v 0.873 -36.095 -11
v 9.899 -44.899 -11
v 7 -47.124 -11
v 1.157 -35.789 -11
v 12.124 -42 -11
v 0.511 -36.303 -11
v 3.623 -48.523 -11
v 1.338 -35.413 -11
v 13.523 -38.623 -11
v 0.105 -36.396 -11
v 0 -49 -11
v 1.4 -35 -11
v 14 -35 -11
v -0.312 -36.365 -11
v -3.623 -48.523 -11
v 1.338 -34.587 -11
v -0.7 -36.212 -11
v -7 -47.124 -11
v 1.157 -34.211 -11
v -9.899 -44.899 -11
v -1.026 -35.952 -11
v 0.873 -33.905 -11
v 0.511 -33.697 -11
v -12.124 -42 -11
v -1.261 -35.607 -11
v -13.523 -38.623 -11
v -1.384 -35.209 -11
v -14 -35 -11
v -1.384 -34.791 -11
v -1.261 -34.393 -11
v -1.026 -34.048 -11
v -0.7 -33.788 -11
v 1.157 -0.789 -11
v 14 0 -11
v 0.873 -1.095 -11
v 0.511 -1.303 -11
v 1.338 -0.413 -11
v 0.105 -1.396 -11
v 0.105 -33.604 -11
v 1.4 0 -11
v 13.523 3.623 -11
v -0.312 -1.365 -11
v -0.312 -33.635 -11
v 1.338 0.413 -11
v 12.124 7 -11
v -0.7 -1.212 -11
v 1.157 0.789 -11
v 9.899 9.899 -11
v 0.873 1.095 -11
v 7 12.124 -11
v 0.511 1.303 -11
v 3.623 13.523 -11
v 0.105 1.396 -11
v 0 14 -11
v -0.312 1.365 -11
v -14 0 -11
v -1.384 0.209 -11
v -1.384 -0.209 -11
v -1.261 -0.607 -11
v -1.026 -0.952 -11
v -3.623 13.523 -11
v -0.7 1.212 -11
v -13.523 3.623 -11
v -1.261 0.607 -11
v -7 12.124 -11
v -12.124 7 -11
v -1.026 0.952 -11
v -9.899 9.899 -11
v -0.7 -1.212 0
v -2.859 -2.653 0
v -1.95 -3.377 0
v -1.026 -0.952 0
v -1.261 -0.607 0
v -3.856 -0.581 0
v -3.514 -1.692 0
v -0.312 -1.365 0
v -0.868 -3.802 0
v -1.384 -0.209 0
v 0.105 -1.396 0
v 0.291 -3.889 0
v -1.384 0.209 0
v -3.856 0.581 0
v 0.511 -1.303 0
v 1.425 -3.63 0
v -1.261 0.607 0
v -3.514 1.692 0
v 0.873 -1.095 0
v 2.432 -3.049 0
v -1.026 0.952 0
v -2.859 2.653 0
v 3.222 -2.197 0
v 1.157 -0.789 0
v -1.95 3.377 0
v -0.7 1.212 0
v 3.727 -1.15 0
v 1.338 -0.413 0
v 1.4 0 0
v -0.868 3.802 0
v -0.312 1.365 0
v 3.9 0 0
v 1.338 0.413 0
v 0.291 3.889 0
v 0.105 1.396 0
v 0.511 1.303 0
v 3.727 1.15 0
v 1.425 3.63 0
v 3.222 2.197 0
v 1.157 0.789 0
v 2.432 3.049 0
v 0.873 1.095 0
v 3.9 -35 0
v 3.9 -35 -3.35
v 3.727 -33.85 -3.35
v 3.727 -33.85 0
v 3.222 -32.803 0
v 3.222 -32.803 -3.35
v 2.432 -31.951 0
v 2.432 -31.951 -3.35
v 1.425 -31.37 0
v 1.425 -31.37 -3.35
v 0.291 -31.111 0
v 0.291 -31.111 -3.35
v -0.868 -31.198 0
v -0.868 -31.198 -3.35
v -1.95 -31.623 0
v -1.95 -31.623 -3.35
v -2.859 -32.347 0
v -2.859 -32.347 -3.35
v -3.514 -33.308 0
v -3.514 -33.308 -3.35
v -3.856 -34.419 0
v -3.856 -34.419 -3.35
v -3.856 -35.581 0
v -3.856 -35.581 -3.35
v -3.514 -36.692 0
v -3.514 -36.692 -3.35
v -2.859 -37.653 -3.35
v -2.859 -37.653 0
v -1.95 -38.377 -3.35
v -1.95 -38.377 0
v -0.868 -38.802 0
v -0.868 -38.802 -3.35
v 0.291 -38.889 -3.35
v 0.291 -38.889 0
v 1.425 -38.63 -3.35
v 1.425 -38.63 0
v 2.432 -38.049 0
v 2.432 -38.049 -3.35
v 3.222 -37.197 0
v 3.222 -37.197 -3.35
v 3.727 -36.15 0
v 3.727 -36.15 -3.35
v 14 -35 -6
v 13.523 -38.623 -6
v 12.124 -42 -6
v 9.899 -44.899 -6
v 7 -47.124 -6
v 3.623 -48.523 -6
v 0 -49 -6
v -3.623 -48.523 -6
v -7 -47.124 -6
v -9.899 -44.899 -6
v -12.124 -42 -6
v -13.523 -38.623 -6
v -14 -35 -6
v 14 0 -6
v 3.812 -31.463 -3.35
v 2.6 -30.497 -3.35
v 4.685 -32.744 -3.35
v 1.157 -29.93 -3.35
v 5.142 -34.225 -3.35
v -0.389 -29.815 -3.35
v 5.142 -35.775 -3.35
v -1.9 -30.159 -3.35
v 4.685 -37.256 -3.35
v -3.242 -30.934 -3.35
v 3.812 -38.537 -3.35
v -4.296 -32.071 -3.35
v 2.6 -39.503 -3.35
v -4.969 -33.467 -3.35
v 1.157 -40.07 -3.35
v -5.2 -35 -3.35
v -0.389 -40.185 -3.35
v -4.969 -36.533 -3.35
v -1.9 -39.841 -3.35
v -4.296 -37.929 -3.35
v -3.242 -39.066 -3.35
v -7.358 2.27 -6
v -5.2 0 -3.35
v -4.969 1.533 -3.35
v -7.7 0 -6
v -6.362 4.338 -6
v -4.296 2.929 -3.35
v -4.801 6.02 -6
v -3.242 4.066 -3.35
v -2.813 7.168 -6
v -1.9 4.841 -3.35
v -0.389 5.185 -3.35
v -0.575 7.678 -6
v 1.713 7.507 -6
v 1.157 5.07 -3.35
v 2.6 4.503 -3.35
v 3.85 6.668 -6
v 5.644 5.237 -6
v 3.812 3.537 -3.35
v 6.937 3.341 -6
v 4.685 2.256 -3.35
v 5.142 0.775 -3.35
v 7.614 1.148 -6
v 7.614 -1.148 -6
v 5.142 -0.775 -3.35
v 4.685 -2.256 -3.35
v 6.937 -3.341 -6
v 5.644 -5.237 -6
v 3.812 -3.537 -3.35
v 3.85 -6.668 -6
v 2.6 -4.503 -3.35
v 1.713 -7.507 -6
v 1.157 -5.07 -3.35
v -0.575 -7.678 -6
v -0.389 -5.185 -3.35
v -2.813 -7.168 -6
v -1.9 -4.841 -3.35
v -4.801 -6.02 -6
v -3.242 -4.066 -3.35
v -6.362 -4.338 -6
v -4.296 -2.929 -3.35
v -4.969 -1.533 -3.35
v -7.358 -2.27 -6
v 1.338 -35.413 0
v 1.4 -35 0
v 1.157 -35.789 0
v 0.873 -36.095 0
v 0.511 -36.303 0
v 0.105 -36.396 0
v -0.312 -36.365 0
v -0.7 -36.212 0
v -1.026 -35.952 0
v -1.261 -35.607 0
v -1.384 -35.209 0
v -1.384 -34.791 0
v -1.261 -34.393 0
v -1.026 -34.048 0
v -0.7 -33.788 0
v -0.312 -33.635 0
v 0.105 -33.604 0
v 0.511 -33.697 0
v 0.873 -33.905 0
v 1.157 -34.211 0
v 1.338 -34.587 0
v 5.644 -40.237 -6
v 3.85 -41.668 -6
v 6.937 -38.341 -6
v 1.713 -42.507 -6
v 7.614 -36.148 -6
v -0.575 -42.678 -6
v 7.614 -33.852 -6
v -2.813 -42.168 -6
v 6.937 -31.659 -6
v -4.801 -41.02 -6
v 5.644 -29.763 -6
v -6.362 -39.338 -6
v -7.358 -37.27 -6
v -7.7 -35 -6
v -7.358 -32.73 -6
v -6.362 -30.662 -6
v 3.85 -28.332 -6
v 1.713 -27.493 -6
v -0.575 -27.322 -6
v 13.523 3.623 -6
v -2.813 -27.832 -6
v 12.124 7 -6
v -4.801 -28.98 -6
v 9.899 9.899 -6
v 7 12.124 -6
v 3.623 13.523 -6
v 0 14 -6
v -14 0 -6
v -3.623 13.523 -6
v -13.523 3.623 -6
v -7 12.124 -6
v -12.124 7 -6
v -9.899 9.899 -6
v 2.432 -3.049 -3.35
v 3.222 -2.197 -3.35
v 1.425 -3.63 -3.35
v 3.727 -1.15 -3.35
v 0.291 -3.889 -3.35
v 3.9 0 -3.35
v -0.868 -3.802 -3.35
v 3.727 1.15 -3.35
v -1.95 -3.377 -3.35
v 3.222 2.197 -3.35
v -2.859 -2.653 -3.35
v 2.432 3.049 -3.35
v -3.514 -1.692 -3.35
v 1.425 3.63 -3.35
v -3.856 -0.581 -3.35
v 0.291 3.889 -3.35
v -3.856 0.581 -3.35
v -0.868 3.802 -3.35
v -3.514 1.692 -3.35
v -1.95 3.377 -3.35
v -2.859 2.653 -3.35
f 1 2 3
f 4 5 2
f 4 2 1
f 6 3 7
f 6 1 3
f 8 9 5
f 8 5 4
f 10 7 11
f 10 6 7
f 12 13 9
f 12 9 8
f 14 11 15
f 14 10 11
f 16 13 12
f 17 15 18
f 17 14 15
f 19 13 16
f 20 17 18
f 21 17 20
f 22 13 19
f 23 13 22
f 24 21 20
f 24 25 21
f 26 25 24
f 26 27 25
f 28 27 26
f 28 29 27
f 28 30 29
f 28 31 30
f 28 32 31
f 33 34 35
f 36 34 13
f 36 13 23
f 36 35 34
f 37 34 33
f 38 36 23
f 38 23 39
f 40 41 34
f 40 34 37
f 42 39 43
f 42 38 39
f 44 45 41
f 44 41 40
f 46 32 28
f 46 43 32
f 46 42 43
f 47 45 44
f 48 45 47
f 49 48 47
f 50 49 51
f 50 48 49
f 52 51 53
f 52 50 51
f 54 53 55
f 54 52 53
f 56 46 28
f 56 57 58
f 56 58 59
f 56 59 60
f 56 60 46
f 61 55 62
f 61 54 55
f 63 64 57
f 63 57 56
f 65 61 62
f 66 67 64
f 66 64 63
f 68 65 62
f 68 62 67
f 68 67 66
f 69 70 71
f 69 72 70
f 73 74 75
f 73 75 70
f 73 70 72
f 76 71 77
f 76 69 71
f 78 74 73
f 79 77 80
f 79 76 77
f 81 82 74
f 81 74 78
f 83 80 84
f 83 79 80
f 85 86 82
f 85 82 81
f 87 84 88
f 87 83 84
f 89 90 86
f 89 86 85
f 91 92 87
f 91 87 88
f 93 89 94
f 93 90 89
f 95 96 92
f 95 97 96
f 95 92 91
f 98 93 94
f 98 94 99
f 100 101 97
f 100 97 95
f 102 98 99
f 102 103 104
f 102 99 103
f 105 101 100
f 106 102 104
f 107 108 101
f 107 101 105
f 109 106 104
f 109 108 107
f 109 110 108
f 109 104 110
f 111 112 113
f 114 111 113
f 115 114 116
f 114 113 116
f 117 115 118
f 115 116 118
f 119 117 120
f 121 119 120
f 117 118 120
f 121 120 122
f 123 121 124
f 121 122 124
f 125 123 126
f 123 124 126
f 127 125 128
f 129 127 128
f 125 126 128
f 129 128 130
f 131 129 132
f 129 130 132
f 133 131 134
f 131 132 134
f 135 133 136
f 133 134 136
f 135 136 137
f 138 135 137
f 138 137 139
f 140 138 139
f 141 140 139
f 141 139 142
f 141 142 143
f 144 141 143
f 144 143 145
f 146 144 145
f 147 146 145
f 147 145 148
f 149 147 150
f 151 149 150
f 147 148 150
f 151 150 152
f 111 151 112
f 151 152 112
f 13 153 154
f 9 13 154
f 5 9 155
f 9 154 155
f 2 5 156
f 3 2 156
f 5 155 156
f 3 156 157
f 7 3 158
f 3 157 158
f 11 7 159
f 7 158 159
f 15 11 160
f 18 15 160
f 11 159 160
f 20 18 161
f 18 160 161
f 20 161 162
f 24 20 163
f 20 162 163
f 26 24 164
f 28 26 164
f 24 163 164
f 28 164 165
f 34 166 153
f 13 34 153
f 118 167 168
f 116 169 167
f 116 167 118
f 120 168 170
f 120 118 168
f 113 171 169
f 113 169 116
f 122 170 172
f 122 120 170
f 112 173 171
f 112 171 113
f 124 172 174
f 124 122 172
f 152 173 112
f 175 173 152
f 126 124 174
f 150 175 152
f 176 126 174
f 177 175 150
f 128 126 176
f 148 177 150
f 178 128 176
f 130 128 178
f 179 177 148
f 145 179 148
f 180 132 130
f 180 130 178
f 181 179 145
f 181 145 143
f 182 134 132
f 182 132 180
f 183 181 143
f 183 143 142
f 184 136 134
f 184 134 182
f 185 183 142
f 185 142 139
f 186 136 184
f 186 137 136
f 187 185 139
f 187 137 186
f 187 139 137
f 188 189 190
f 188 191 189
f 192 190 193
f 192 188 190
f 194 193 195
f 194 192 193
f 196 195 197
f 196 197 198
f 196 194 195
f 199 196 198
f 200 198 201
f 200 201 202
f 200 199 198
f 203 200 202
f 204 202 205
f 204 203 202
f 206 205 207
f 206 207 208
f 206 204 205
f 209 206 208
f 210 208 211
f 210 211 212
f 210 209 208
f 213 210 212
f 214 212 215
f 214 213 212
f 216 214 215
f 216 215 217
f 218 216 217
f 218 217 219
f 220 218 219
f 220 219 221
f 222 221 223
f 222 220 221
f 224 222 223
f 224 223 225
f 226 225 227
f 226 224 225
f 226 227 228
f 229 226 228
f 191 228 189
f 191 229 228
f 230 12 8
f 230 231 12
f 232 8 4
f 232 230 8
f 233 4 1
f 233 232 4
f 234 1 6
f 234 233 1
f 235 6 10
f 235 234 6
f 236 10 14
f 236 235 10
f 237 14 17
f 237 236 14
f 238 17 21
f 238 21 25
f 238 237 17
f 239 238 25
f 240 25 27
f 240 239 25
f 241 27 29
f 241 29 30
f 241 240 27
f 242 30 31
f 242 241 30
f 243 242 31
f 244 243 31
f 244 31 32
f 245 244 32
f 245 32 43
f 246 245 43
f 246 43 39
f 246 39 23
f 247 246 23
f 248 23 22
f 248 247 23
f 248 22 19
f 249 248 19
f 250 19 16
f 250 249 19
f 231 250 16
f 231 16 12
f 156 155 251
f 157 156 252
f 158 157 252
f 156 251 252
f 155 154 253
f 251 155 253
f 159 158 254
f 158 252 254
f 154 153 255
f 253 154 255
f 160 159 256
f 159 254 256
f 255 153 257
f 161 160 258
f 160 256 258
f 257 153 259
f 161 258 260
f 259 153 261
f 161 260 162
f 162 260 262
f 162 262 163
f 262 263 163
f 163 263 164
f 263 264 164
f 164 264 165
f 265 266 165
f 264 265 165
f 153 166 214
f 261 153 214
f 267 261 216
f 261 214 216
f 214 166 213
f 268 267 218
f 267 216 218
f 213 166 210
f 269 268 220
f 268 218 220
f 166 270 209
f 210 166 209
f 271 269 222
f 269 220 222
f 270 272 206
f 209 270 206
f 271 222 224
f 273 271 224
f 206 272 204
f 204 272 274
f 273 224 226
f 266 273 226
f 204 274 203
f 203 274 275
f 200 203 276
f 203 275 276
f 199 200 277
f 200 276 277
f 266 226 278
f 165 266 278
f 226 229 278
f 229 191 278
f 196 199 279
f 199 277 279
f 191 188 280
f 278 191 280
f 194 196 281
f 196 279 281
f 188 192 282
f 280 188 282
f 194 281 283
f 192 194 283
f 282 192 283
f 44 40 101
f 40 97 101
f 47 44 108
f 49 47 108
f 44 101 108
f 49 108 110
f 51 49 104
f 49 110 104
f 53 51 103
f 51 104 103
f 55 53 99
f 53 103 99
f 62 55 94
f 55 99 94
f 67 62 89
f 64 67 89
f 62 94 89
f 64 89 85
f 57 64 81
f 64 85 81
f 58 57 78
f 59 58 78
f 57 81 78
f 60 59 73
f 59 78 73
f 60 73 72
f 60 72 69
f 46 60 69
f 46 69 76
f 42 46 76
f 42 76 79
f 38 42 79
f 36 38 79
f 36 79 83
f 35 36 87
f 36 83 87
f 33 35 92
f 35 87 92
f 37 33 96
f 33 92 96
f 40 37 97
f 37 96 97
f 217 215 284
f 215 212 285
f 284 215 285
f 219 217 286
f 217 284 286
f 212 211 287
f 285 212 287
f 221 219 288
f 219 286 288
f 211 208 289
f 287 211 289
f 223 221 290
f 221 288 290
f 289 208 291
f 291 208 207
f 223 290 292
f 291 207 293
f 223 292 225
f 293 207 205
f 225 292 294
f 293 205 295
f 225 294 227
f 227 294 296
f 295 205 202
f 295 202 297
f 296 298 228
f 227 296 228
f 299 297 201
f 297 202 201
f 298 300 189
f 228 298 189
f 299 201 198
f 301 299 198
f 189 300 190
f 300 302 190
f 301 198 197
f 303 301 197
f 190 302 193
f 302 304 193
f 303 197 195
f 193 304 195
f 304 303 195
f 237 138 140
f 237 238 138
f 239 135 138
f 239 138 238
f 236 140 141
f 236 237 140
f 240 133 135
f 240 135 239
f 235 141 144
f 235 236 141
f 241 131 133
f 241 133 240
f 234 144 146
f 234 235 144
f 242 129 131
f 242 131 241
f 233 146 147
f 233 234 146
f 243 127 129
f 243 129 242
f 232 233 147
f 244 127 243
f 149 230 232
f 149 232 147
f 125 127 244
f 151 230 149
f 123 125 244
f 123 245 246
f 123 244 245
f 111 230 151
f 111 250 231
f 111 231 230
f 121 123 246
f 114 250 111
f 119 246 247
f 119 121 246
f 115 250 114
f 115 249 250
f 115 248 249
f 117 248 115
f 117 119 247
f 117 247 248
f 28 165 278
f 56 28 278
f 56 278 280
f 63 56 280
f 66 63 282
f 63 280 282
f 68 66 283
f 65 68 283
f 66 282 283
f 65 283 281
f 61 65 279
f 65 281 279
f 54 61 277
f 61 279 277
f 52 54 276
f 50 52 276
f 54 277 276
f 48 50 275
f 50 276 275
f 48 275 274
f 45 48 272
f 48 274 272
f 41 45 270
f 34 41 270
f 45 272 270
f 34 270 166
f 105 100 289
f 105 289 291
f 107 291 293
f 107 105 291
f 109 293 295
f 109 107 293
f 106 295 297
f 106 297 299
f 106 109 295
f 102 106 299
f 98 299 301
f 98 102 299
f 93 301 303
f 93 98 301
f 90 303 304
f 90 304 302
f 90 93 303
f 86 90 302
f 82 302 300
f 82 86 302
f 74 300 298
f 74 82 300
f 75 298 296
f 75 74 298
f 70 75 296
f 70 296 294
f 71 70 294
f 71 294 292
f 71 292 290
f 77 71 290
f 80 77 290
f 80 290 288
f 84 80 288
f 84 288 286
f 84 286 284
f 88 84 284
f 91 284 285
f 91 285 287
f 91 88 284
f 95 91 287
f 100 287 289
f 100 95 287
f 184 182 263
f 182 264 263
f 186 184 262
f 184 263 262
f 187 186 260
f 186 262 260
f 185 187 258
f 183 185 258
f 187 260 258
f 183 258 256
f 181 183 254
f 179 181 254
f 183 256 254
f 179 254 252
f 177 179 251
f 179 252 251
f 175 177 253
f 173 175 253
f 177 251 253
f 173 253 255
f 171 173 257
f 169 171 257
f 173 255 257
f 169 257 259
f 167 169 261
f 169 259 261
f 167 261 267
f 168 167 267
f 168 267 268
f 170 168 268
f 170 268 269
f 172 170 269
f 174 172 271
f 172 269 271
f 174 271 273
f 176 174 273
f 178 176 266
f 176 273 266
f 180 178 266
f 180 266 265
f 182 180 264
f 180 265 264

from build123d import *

# Parameters (mm, degrees)
SKETCH_1_R           = 3.9
SKETCH_1_R_2         = 1.4
EXTRUDE_1_DEPTH      = 3.35
SKETCH_2_R           = 5.2
SKETCH_3_R           = 7.7
EXTRUDE_2_DEPTH      = 5
MIRROR_START         = -3.35
MIRROR_6_OUTLINE_R   = 3.9
MIRROR_6_OUTLINE_R_2 = 1.4
MIRROR_6_DEPTH       = 3.35
SKETCH_1_3_R         = 1.4
CUT_EXTRUDE_1_DEPTH  = 11


# Read off the part's stored shape, not the designer's step: 镜向6
with BuildPart() as part:
    # 草图1 → 凸台-拉伸1 (new body)
    with BuildSketch(Plane.XY):
        Circle(SKETCH_1_R)
        Circle(SKETCH_1_R_2, mode=Mode.SUBTRACT)
    extrude(amount=-EXTRUDE_1_DEPTH)

    # 草图2 → 放样1 section 0
    with BuildSketch(Plane(origin=(0, 0, -3.35), x_dir=(-1, 0, 0), z_dir=(0, 0, -1))):
        Circle(SKETCH_2_R)
    # 草图3 → 放样1 section 1
    with BuildSketch(Plane(origin=(0, 0, -6), x_dir=(-1, 0, 0), z_dir=(0, 0, -1))):
        Circle(SKETCH_3_R)
    loft_1 = loft()

    # 草图5 → 凸台-拉伸2 (add)
    with BuildSketch(Plane(origin=(0, 0, -6), x_dir=(-1, 0, 0), z_dir=(0, 0, -1))):
        with BuildLine():
            Line((-14, 0), (-14, -35))
            ThreePointArc((-14, -35), (0, -49), (14, -35))
            Line((14, -35), (14, 0))
            ThreePointArc((14, 0), (0, 14), (-14, 0))
        make_face()
    extrude(amount=EXTRUDE_2_DEPTH)

    # 镜向5: 放样1 across plane
    add(loft_1.mirror(Plane(origin=(0, -17.5, 0), x_dir=(0, 0, 1), z_dir=(0, -1, 0))))

    # 镜向6 outline → 镜向6 (add)
    with BuildSketch(Plane.XY.offset(MIRROR_START)):
        with Locations((0, -35)):
            Circle(MIRROR_6_OUTLINE_R)
        with Locations((0, -35)):
            Circle(MIRROR_6_OUTLINE_R_2, mode=Mode.SUBTRACT)
    extrude(amount=MIRROR_6_DEPTH)

    # 草图1<3> → 切除-拉伸1 (cut)
    with BuildSketch(Plane.XY):
        Circle(SKETCH_1_3_R)
    cut_extrude_1 = extrude(amount=-CUT_EXTRUDE_1_DEPTH, mode=Mode.SUBTRACT)

    # 镜向7: 切除-拉伸1 across plane
    add(cut_extrude_1.mirror(Plane(origin=(0, -17.5, 0), x_dir=(0, 0, 1), z_dir=(0, -1, 0))), mode=Mode.SUBTRACT)


solid = part.part
